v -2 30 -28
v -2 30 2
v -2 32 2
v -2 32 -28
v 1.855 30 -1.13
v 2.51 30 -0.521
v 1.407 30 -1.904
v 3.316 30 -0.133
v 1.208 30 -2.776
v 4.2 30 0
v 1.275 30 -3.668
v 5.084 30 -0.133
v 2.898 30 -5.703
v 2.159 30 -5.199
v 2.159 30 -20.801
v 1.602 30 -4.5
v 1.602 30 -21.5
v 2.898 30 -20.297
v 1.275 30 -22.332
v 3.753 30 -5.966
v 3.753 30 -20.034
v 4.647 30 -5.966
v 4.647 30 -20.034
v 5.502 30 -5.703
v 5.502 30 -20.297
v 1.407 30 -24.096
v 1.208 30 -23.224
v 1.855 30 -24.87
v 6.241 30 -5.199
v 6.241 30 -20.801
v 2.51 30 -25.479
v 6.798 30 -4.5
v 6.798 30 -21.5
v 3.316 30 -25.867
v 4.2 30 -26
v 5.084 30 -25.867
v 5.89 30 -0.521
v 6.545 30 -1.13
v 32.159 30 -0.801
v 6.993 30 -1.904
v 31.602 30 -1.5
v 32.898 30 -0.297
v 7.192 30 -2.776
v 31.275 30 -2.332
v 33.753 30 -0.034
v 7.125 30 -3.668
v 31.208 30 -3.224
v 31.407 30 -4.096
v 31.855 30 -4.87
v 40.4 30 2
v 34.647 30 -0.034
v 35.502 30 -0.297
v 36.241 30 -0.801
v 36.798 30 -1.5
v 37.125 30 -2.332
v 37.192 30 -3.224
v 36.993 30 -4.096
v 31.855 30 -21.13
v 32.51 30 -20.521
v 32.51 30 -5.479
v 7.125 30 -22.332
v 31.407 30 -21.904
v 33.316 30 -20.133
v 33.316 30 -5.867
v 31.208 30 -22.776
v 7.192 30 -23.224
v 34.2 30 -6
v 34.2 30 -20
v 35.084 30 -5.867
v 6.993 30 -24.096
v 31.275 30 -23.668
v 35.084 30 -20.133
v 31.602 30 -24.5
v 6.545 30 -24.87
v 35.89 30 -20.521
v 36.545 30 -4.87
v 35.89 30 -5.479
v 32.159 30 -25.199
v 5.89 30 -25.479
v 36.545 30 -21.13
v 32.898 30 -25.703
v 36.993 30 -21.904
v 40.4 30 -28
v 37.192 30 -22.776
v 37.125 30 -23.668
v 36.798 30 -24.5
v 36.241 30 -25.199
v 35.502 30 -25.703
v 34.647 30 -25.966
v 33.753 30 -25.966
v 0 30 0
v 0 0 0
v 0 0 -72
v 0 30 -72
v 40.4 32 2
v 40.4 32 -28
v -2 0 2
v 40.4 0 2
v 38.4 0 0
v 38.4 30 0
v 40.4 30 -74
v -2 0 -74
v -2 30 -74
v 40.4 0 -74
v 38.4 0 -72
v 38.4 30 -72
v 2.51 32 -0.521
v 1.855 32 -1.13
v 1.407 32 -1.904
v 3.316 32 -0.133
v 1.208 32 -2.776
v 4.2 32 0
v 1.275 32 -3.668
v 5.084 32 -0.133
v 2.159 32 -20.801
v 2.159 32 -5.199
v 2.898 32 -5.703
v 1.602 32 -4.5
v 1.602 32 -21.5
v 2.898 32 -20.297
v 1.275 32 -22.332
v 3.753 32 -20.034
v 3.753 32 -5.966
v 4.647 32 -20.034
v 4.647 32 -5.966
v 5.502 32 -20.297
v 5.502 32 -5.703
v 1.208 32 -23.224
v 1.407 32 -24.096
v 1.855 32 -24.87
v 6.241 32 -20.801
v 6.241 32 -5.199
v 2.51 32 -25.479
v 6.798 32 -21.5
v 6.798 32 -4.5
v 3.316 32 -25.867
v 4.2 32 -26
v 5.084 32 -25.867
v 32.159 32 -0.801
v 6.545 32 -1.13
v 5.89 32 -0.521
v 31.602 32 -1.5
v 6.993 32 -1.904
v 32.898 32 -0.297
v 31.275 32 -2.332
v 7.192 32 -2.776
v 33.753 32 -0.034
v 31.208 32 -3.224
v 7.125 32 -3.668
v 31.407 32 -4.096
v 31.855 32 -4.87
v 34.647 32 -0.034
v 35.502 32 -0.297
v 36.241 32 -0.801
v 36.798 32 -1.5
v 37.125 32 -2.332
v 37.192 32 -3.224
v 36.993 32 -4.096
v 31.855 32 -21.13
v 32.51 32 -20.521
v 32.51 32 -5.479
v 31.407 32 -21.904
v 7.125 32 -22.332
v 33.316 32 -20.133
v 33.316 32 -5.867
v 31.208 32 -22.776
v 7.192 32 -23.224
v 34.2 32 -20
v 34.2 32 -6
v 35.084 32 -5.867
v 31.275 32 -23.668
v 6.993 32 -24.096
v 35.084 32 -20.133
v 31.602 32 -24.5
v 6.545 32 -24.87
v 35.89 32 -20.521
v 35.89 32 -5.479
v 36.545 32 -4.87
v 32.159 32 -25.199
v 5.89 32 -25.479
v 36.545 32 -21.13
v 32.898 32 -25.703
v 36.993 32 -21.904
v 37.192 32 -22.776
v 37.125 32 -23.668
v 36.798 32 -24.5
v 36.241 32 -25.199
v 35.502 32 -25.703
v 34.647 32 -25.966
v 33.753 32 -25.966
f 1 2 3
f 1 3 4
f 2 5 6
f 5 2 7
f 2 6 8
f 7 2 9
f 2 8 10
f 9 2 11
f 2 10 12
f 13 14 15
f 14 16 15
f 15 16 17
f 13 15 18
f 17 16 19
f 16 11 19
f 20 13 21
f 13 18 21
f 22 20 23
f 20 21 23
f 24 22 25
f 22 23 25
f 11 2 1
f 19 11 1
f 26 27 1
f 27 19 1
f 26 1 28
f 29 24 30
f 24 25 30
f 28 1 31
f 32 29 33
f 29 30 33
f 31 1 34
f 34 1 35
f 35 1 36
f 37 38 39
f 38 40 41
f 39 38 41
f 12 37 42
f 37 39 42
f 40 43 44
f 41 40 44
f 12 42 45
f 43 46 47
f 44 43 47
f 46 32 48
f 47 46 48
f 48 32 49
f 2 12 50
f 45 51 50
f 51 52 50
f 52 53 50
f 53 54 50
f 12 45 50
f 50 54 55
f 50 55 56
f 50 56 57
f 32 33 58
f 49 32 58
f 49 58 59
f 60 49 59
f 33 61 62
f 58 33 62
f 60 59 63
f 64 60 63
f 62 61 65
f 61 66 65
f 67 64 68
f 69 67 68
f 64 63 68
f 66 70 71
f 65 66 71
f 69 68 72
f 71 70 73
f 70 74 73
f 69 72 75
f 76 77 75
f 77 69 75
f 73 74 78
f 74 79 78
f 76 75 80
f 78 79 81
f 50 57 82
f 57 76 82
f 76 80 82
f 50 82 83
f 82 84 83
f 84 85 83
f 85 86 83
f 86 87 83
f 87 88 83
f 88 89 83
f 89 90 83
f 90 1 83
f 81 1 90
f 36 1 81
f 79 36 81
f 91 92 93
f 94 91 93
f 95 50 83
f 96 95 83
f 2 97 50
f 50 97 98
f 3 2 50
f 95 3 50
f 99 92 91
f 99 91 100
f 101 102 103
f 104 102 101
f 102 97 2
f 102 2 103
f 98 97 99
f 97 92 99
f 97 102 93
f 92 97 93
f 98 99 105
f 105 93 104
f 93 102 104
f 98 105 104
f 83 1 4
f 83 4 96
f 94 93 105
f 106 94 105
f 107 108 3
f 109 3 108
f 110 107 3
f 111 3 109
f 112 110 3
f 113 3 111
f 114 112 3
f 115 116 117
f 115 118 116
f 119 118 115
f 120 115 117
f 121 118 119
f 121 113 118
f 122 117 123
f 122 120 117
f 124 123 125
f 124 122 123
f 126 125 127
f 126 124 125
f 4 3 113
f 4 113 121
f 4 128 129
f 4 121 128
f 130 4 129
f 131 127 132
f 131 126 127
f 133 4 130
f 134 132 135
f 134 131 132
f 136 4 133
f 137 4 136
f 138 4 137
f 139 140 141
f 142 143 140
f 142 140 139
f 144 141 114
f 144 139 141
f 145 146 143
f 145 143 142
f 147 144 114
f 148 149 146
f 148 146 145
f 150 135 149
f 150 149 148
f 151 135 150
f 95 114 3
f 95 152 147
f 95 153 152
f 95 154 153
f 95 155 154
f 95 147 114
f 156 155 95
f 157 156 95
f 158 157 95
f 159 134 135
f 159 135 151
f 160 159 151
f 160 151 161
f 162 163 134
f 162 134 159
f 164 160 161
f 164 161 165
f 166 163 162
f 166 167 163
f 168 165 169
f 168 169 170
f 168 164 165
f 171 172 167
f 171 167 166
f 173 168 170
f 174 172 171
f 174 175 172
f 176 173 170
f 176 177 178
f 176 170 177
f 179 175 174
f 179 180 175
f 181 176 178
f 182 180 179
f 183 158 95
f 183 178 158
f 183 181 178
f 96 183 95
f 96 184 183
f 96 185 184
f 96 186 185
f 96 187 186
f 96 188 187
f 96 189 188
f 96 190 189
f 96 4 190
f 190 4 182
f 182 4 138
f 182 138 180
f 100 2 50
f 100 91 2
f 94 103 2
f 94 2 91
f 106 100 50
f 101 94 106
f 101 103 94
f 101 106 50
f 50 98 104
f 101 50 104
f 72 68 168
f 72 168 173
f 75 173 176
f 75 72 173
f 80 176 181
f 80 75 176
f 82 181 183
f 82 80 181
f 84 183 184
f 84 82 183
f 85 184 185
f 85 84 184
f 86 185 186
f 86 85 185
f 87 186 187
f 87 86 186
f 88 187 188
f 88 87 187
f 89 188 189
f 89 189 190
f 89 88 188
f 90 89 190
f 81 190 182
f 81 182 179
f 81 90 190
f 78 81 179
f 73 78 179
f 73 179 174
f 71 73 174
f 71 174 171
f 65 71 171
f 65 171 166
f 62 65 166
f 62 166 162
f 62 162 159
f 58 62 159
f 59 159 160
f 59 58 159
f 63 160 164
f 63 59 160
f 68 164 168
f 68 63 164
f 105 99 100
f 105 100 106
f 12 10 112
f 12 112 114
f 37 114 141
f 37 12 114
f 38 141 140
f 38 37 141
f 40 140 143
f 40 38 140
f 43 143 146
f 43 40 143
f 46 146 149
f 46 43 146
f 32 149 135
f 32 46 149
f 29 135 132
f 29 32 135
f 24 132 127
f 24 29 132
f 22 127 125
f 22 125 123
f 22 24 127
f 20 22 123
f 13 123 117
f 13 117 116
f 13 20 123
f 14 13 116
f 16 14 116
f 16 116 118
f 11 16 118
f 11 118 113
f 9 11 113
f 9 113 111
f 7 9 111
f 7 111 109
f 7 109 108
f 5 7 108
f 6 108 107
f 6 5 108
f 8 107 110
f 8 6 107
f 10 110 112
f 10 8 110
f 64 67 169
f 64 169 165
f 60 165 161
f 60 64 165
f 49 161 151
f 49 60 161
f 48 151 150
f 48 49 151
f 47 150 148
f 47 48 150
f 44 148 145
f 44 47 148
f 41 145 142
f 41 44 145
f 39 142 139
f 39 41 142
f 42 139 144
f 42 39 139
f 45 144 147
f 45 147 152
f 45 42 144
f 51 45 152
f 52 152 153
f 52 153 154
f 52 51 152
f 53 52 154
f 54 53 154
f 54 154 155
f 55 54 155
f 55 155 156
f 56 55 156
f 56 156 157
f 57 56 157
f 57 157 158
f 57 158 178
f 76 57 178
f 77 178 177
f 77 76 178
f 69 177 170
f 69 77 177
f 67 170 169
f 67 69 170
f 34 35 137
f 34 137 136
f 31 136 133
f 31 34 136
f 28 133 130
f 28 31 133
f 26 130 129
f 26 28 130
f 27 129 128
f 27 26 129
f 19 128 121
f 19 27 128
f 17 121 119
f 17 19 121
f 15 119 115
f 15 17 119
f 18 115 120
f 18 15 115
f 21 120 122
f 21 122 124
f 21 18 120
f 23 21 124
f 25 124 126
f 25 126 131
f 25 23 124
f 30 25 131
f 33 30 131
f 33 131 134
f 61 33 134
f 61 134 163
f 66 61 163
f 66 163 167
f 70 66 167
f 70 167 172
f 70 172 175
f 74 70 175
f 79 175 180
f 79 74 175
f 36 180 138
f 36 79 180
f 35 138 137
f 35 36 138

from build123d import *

# Parameters (mm, degrees)
SKETCH2_W           = 42.4
SKETCH2_H           = 76
SKETCH2_W_2         = 38.4
SKETCH2_H_2         = 72
BOSS_EXTRUDE4_DEPTH = 30
SKETCH1_W           = 42.4
SKETCH1_H           = 30
SKETCH1_R           = 3
BOSS_EXTRUDE1_DEPTH = 2


with BuildPart() as part:
    # Sketch2 → Boss-Extrude4 (new body)
    with BuildSketch(Plane(origin=(0, 0, 0), x_dir=(1, 0, 0), z_dir=(0, 1, 0))):
        with Locations((19.2, 36)):
            Rectangle(SKETCH2_W, SKETCH2_H)
        with Locations((19.2, 36)):
            Rectangle(SKETCH2_W_2, SKETCH2_H_2, mode=Mode.SUBTRACT)
    extrude(amount=BOSS_EXTRUDE4_DEPTH)


with BuildPart() as body_2:
    # Sketch1 → Boss-Extrude1 (new body)
    with BuildSketch(Plane(origin=(0, 30, 0), x_dir=(1, 0, 0), z_dir=(0, 1, 0))):
        with Locations((19.2, 13)):
            Rectangle(SKETCH1_W, SKETCH1_H)
        with Locations(Location((4.2, 3, 0), (0, 0, 270))):
            Circle(SKETCH1_R, mode=Mode.SUBTRACT)
        with Locations(Location((34.2, 3, 0), (0, 0, 90))):
            Circle(SKETCH1_R, mode=Mode.SUBTRACT)
        with Locations(Location((34.2, 23, 0), (0, 0, 270))):
            Circle(SKETCH1_R, mode=Mode.SUBTRACT)
        with Locations(Location((4.2, 23, 0), (0, 0, 90))):
            Circle(SKETCH1_R, mode=Mode.SUBTRACT)
    extrude(amount=BOSS_EXTRUDE1_DEPTH)


solid = Compound([part.part, body_2.part])
